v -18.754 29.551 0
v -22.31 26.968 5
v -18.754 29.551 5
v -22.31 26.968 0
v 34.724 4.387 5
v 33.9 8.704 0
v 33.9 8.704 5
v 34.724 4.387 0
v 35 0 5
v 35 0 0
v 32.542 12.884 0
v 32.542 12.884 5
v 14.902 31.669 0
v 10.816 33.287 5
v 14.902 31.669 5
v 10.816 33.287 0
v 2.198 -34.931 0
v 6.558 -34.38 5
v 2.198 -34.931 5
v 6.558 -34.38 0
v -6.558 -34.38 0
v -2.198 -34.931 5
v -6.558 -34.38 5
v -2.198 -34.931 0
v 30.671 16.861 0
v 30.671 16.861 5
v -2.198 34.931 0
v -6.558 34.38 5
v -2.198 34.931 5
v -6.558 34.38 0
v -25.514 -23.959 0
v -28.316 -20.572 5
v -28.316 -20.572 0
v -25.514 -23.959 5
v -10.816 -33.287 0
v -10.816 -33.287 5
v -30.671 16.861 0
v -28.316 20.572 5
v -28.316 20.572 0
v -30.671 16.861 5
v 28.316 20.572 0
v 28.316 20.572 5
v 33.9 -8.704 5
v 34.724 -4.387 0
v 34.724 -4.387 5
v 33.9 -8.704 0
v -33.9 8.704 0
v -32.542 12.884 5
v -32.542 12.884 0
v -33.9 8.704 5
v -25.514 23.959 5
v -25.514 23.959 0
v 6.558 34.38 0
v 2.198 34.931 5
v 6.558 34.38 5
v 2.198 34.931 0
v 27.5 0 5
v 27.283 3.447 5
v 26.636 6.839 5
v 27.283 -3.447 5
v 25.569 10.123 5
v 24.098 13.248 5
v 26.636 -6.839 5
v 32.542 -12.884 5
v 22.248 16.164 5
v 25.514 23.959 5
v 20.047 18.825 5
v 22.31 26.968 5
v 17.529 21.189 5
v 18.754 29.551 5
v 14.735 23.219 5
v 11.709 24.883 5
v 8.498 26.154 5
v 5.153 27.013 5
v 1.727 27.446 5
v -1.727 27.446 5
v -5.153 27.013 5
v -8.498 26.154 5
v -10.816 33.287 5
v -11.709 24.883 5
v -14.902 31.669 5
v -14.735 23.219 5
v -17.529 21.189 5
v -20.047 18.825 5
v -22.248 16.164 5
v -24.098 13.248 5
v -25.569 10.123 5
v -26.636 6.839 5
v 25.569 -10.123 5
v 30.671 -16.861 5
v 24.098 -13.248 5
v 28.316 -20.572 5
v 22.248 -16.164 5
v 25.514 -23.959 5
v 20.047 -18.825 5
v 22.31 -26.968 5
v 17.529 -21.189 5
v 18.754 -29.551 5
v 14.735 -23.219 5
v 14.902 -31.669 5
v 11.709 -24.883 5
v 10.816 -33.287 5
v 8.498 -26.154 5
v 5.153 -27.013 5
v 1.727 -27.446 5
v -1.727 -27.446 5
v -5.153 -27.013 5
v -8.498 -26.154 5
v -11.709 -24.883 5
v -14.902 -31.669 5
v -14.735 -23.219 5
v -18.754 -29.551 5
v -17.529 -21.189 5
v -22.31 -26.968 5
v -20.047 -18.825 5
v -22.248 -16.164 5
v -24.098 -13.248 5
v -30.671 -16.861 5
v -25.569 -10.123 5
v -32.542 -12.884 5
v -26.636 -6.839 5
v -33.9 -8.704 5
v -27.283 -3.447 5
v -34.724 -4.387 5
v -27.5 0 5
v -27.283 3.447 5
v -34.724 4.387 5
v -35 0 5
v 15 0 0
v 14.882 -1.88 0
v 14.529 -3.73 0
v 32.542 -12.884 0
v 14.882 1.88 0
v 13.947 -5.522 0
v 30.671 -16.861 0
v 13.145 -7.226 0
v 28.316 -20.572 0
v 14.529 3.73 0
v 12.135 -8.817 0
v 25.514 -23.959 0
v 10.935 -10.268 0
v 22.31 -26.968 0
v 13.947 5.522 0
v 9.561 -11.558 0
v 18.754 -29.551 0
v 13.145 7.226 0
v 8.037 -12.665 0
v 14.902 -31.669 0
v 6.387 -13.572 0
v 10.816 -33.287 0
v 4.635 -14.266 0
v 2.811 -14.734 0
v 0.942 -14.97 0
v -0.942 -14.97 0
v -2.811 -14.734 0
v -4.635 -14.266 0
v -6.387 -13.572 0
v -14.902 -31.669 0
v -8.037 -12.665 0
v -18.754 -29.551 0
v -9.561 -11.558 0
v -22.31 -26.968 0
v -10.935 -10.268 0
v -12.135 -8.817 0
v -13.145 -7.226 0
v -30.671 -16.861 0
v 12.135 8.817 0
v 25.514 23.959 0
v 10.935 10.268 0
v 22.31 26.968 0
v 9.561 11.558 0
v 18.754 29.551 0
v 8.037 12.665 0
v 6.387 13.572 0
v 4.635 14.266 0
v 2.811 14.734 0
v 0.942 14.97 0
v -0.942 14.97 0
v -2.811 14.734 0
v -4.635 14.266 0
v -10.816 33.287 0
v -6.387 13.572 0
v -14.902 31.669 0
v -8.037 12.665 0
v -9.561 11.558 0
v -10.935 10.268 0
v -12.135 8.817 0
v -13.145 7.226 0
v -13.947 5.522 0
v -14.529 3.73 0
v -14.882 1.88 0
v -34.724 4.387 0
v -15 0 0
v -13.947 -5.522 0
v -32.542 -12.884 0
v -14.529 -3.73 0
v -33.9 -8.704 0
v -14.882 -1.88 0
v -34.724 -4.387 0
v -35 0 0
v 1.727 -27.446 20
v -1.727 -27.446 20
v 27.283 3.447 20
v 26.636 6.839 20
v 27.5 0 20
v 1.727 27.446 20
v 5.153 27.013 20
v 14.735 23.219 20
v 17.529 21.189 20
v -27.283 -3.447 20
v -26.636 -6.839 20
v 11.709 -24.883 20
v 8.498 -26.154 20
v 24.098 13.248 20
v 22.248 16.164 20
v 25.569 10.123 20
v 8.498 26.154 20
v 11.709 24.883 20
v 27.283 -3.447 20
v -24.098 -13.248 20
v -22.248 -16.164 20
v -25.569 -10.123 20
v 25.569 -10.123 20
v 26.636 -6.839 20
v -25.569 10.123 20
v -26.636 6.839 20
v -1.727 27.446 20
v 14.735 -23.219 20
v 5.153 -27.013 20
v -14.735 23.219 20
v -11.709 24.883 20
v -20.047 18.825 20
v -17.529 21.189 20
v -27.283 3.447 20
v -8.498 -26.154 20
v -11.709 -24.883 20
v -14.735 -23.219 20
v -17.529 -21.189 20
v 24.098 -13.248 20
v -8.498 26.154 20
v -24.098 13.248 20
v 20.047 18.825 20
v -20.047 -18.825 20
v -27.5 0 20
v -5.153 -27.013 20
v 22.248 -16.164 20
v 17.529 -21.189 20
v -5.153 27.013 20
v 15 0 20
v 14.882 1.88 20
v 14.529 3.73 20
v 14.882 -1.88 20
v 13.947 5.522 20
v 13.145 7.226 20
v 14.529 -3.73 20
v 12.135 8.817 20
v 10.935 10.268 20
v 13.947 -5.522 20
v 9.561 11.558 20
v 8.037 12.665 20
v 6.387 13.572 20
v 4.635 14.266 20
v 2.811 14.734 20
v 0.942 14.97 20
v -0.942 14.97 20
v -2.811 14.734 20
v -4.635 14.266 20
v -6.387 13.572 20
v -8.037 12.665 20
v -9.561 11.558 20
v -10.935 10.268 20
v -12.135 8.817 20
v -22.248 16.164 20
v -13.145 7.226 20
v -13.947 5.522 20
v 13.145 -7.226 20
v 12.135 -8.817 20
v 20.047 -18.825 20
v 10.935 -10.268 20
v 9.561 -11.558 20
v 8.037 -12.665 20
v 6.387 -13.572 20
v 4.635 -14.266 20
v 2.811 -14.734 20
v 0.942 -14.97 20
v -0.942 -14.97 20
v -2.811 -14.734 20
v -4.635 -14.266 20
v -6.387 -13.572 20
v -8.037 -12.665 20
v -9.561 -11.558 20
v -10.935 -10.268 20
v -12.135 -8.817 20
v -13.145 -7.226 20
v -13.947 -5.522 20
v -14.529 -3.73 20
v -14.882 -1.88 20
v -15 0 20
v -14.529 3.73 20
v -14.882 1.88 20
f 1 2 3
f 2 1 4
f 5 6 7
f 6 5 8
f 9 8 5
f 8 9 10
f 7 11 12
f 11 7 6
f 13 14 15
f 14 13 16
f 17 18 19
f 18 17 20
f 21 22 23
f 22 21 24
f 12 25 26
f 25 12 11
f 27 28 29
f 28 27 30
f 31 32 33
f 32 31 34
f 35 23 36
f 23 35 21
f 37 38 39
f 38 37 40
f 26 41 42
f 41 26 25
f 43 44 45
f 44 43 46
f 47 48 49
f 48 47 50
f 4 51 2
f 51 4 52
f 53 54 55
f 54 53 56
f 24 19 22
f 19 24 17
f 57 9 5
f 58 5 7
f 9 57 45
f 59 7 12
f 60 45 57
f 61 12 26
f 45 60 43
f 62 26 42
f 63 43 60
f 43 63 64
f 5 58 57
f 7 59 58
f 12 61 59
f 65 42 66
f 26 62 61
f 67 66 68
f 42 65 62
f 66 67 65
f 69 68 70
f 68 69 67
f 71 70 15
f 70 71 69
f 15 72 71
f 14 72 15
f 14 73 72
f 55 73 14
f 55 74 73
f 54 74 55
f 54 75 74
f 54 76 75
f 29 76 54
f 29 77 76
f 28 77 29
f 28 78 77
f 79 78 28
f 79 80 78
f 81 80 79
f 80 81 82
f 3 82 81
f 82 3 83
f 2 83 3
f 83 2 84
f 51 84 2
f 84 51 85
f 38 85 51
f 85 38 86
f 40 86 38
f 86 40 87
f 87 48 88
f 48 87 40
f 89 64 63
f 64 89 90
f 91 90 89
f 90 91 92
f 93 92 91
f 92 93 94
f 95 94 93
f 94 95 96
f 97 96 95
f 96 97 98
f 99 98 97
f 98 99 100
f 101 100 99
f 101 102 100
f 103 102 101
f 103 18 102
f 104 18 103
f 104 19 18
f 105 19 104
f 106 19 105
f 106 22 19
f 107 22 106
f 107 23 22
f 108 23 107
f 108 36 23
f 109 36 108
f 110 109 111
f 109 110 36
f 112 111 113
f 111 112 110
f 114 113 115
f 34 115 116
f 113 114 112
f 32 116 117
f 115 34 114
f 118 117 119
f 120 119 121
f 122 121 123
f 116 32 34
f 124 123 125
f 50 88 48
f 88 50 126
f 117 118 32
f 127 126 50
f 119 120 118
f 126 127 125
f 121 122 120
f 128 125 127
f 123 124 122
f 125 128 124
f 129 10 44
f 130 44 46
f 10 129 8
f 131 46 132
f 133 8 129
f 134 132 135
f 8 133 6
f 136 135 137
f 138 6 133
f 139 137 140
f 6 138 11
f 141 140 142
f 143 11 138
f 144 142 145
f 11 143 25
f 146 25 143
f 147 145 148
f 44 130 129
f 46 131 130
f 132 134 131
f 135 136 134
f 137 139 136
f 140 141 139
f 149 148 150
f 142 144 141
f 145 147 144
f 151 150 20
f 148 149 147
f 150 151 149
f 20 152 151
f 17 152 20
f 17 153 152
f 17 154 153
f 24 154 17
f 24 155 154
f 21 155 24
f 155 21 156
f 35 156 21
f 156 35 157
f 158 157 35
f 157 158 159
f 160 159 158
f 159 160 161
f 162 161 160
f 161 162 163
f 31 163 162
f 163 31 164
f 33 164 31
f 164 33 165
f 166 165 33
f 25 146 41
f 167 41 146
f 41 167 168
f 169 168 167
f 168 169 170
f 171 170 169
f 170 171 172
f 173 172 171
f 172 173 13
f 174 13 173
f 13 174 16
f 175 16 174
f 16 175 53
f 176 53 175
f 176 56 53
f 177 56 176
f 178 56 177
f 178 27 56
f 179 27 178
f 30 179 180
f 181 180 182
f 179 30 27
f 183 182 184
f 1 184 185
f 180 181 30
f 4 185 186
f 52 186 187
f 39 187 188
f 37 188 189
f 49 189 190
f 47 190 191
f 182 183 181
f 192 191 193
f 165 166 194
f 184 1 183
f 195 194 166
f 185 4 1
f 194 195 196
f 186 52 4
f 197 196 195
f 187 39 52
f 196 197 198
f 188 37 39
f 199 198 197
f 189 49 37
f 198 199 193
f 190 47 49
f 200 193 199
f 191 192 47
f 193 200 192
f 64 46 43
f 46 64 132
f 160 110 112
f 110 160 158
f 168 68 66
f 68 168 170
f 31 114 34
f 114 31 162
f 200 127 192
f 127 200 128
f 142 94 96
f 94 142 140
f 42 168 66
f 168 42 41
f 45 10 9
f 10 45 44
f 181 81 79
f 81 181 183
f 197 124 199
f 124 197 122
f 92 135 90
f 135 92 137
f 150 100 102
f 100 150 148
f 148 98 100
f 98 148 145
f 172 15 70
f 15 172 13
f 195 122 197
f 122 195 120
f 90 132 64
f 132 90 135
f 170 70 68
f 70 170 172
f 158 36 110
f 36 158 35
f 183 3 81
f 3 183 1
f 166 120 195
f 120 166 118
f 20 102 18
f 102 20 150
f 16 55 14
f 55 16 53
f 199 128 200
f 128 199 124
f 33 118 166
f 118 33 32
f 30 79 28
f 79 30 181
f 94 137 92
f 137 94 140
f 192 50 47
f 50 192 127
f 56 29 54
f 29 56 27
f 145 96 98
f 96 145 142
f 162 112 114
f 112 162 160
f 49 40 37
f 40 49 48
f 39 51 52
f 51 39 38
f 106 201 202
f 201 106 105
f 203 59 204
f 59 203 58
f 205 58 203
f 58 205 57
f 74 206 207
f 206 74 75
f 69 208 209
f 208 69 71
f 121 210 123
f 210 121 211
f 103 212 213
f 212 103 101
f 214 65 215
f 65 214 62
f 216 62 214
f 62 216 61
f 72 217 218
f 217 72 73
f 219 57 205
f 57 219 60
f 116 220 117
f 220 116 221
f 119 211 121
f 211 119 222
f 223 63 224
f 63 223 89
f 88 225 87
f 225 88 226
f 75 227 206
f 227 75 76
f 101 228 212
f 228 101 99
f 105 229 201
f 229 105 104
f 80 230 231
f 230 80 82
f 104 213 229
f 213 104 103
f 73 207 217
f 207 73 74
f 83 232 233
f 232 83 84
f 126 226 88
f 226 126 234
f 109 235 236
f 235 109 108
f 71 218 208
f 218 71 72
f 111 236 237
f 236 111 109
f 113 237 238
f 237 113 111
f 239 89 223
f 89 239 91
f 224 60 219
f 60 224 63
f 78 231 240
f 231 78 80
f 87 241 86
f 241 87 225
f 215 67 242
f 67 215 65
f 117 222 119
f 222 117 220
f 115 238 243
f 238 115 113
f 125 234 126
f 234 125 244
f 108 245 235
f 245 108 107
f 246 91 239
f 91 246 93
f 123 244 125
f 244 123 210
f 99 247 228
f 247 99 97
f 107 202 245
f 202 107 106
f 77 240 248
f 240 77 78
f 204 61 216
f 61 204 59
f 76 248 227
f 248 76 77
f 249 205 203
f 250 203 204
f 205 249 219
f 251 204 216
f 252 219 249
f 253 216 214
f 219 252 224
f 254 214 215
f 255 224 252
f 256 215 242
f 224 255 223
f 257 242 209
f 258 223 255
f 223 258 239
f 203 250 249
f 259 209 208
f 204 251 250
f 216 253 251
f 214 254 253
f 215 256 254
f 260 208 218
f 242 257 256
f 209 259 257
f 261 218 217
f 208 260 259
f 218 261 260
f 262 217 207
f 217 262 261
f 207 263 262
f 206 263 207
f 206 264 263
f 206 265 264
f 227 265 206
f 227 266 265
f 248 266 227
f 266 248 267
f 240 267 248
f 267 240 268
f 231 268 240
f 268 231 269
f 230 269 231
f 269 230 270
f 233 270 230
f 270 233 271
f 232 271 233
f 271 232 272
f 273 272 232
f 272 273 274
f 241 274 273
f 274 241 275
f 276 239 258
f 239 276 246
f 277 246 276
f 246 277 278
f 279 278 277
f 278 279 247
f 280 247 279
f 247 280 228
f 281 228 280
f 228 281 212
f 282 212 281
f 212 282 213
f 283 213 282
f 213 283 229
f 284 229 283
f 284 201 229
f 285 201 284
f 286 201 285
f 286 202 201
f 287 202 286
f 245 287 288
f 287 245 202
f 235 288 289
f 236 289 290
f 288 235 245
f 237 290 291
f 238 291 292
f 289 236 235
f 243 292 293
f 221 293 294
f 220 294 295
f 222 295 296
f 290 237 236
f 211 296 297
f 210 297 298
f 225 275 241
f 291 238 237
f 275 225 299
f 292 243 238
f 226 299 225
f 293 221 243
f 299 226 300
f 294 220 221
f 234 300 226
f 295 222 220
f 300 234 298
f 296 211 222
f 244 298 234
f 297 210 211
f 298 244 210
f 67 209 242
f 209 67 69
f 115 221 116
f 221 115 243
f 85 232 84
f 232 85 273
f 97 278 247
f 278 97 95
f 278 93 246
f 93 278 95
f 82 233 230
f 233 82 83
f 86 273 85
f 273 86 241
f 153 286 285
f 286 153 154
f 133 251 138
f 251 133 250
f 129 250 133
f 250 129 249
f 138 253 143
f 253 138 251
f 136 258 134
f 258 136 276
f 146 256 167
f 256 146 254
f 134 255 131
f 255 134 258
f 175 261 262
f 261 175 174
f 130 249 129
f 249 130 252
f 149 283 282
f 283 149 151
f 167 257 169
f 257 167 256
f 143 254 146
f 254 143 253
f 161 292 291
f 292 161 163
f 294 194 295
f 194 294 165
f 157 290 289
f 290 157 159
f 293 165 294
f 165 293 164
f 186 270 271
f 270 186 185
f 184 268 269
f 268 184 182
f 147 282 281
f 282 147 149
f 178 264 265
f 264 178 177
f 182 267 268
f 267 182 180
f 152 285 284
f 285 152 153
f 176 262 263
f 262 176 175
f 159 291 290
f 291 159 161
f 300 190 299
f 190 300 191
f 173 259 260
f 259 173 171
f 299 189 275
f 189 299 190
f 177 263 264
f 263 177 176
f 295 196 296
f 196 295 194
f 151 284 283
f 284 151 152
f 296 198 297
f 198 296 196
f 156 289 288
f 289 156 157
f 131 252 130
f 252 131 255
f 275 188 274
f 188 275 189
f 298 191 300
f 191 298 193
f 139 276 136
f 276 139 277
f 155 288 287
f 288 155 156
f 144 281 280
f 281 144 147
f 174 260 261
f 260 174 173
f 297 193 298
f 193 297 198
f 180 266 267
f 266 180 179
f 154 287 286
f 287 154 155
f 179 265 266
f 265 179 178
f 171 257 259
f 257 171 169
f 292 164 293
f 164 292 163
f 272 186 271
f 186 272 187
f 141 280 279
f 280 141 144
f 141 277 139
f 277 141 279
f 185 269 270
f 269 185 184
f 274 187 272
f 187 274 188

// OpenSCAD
//External diameter
ext_diam= 70;

//Internal diameter
int_diam = 55;

//Internal height
int_height = 20; 

//Hole diameter
hole_diam = 30;

hole_height = int_height + 5;

difference() {
    union() {
        cylinder(d=ext_diam, h=5, $fn=50);
        cylinder(d=int_diam, h=int_height, $fn=50);
    }
    translate ([0,0,0]) cylinder(d=hole_diam, h=hole_height, $fn=50);
}
